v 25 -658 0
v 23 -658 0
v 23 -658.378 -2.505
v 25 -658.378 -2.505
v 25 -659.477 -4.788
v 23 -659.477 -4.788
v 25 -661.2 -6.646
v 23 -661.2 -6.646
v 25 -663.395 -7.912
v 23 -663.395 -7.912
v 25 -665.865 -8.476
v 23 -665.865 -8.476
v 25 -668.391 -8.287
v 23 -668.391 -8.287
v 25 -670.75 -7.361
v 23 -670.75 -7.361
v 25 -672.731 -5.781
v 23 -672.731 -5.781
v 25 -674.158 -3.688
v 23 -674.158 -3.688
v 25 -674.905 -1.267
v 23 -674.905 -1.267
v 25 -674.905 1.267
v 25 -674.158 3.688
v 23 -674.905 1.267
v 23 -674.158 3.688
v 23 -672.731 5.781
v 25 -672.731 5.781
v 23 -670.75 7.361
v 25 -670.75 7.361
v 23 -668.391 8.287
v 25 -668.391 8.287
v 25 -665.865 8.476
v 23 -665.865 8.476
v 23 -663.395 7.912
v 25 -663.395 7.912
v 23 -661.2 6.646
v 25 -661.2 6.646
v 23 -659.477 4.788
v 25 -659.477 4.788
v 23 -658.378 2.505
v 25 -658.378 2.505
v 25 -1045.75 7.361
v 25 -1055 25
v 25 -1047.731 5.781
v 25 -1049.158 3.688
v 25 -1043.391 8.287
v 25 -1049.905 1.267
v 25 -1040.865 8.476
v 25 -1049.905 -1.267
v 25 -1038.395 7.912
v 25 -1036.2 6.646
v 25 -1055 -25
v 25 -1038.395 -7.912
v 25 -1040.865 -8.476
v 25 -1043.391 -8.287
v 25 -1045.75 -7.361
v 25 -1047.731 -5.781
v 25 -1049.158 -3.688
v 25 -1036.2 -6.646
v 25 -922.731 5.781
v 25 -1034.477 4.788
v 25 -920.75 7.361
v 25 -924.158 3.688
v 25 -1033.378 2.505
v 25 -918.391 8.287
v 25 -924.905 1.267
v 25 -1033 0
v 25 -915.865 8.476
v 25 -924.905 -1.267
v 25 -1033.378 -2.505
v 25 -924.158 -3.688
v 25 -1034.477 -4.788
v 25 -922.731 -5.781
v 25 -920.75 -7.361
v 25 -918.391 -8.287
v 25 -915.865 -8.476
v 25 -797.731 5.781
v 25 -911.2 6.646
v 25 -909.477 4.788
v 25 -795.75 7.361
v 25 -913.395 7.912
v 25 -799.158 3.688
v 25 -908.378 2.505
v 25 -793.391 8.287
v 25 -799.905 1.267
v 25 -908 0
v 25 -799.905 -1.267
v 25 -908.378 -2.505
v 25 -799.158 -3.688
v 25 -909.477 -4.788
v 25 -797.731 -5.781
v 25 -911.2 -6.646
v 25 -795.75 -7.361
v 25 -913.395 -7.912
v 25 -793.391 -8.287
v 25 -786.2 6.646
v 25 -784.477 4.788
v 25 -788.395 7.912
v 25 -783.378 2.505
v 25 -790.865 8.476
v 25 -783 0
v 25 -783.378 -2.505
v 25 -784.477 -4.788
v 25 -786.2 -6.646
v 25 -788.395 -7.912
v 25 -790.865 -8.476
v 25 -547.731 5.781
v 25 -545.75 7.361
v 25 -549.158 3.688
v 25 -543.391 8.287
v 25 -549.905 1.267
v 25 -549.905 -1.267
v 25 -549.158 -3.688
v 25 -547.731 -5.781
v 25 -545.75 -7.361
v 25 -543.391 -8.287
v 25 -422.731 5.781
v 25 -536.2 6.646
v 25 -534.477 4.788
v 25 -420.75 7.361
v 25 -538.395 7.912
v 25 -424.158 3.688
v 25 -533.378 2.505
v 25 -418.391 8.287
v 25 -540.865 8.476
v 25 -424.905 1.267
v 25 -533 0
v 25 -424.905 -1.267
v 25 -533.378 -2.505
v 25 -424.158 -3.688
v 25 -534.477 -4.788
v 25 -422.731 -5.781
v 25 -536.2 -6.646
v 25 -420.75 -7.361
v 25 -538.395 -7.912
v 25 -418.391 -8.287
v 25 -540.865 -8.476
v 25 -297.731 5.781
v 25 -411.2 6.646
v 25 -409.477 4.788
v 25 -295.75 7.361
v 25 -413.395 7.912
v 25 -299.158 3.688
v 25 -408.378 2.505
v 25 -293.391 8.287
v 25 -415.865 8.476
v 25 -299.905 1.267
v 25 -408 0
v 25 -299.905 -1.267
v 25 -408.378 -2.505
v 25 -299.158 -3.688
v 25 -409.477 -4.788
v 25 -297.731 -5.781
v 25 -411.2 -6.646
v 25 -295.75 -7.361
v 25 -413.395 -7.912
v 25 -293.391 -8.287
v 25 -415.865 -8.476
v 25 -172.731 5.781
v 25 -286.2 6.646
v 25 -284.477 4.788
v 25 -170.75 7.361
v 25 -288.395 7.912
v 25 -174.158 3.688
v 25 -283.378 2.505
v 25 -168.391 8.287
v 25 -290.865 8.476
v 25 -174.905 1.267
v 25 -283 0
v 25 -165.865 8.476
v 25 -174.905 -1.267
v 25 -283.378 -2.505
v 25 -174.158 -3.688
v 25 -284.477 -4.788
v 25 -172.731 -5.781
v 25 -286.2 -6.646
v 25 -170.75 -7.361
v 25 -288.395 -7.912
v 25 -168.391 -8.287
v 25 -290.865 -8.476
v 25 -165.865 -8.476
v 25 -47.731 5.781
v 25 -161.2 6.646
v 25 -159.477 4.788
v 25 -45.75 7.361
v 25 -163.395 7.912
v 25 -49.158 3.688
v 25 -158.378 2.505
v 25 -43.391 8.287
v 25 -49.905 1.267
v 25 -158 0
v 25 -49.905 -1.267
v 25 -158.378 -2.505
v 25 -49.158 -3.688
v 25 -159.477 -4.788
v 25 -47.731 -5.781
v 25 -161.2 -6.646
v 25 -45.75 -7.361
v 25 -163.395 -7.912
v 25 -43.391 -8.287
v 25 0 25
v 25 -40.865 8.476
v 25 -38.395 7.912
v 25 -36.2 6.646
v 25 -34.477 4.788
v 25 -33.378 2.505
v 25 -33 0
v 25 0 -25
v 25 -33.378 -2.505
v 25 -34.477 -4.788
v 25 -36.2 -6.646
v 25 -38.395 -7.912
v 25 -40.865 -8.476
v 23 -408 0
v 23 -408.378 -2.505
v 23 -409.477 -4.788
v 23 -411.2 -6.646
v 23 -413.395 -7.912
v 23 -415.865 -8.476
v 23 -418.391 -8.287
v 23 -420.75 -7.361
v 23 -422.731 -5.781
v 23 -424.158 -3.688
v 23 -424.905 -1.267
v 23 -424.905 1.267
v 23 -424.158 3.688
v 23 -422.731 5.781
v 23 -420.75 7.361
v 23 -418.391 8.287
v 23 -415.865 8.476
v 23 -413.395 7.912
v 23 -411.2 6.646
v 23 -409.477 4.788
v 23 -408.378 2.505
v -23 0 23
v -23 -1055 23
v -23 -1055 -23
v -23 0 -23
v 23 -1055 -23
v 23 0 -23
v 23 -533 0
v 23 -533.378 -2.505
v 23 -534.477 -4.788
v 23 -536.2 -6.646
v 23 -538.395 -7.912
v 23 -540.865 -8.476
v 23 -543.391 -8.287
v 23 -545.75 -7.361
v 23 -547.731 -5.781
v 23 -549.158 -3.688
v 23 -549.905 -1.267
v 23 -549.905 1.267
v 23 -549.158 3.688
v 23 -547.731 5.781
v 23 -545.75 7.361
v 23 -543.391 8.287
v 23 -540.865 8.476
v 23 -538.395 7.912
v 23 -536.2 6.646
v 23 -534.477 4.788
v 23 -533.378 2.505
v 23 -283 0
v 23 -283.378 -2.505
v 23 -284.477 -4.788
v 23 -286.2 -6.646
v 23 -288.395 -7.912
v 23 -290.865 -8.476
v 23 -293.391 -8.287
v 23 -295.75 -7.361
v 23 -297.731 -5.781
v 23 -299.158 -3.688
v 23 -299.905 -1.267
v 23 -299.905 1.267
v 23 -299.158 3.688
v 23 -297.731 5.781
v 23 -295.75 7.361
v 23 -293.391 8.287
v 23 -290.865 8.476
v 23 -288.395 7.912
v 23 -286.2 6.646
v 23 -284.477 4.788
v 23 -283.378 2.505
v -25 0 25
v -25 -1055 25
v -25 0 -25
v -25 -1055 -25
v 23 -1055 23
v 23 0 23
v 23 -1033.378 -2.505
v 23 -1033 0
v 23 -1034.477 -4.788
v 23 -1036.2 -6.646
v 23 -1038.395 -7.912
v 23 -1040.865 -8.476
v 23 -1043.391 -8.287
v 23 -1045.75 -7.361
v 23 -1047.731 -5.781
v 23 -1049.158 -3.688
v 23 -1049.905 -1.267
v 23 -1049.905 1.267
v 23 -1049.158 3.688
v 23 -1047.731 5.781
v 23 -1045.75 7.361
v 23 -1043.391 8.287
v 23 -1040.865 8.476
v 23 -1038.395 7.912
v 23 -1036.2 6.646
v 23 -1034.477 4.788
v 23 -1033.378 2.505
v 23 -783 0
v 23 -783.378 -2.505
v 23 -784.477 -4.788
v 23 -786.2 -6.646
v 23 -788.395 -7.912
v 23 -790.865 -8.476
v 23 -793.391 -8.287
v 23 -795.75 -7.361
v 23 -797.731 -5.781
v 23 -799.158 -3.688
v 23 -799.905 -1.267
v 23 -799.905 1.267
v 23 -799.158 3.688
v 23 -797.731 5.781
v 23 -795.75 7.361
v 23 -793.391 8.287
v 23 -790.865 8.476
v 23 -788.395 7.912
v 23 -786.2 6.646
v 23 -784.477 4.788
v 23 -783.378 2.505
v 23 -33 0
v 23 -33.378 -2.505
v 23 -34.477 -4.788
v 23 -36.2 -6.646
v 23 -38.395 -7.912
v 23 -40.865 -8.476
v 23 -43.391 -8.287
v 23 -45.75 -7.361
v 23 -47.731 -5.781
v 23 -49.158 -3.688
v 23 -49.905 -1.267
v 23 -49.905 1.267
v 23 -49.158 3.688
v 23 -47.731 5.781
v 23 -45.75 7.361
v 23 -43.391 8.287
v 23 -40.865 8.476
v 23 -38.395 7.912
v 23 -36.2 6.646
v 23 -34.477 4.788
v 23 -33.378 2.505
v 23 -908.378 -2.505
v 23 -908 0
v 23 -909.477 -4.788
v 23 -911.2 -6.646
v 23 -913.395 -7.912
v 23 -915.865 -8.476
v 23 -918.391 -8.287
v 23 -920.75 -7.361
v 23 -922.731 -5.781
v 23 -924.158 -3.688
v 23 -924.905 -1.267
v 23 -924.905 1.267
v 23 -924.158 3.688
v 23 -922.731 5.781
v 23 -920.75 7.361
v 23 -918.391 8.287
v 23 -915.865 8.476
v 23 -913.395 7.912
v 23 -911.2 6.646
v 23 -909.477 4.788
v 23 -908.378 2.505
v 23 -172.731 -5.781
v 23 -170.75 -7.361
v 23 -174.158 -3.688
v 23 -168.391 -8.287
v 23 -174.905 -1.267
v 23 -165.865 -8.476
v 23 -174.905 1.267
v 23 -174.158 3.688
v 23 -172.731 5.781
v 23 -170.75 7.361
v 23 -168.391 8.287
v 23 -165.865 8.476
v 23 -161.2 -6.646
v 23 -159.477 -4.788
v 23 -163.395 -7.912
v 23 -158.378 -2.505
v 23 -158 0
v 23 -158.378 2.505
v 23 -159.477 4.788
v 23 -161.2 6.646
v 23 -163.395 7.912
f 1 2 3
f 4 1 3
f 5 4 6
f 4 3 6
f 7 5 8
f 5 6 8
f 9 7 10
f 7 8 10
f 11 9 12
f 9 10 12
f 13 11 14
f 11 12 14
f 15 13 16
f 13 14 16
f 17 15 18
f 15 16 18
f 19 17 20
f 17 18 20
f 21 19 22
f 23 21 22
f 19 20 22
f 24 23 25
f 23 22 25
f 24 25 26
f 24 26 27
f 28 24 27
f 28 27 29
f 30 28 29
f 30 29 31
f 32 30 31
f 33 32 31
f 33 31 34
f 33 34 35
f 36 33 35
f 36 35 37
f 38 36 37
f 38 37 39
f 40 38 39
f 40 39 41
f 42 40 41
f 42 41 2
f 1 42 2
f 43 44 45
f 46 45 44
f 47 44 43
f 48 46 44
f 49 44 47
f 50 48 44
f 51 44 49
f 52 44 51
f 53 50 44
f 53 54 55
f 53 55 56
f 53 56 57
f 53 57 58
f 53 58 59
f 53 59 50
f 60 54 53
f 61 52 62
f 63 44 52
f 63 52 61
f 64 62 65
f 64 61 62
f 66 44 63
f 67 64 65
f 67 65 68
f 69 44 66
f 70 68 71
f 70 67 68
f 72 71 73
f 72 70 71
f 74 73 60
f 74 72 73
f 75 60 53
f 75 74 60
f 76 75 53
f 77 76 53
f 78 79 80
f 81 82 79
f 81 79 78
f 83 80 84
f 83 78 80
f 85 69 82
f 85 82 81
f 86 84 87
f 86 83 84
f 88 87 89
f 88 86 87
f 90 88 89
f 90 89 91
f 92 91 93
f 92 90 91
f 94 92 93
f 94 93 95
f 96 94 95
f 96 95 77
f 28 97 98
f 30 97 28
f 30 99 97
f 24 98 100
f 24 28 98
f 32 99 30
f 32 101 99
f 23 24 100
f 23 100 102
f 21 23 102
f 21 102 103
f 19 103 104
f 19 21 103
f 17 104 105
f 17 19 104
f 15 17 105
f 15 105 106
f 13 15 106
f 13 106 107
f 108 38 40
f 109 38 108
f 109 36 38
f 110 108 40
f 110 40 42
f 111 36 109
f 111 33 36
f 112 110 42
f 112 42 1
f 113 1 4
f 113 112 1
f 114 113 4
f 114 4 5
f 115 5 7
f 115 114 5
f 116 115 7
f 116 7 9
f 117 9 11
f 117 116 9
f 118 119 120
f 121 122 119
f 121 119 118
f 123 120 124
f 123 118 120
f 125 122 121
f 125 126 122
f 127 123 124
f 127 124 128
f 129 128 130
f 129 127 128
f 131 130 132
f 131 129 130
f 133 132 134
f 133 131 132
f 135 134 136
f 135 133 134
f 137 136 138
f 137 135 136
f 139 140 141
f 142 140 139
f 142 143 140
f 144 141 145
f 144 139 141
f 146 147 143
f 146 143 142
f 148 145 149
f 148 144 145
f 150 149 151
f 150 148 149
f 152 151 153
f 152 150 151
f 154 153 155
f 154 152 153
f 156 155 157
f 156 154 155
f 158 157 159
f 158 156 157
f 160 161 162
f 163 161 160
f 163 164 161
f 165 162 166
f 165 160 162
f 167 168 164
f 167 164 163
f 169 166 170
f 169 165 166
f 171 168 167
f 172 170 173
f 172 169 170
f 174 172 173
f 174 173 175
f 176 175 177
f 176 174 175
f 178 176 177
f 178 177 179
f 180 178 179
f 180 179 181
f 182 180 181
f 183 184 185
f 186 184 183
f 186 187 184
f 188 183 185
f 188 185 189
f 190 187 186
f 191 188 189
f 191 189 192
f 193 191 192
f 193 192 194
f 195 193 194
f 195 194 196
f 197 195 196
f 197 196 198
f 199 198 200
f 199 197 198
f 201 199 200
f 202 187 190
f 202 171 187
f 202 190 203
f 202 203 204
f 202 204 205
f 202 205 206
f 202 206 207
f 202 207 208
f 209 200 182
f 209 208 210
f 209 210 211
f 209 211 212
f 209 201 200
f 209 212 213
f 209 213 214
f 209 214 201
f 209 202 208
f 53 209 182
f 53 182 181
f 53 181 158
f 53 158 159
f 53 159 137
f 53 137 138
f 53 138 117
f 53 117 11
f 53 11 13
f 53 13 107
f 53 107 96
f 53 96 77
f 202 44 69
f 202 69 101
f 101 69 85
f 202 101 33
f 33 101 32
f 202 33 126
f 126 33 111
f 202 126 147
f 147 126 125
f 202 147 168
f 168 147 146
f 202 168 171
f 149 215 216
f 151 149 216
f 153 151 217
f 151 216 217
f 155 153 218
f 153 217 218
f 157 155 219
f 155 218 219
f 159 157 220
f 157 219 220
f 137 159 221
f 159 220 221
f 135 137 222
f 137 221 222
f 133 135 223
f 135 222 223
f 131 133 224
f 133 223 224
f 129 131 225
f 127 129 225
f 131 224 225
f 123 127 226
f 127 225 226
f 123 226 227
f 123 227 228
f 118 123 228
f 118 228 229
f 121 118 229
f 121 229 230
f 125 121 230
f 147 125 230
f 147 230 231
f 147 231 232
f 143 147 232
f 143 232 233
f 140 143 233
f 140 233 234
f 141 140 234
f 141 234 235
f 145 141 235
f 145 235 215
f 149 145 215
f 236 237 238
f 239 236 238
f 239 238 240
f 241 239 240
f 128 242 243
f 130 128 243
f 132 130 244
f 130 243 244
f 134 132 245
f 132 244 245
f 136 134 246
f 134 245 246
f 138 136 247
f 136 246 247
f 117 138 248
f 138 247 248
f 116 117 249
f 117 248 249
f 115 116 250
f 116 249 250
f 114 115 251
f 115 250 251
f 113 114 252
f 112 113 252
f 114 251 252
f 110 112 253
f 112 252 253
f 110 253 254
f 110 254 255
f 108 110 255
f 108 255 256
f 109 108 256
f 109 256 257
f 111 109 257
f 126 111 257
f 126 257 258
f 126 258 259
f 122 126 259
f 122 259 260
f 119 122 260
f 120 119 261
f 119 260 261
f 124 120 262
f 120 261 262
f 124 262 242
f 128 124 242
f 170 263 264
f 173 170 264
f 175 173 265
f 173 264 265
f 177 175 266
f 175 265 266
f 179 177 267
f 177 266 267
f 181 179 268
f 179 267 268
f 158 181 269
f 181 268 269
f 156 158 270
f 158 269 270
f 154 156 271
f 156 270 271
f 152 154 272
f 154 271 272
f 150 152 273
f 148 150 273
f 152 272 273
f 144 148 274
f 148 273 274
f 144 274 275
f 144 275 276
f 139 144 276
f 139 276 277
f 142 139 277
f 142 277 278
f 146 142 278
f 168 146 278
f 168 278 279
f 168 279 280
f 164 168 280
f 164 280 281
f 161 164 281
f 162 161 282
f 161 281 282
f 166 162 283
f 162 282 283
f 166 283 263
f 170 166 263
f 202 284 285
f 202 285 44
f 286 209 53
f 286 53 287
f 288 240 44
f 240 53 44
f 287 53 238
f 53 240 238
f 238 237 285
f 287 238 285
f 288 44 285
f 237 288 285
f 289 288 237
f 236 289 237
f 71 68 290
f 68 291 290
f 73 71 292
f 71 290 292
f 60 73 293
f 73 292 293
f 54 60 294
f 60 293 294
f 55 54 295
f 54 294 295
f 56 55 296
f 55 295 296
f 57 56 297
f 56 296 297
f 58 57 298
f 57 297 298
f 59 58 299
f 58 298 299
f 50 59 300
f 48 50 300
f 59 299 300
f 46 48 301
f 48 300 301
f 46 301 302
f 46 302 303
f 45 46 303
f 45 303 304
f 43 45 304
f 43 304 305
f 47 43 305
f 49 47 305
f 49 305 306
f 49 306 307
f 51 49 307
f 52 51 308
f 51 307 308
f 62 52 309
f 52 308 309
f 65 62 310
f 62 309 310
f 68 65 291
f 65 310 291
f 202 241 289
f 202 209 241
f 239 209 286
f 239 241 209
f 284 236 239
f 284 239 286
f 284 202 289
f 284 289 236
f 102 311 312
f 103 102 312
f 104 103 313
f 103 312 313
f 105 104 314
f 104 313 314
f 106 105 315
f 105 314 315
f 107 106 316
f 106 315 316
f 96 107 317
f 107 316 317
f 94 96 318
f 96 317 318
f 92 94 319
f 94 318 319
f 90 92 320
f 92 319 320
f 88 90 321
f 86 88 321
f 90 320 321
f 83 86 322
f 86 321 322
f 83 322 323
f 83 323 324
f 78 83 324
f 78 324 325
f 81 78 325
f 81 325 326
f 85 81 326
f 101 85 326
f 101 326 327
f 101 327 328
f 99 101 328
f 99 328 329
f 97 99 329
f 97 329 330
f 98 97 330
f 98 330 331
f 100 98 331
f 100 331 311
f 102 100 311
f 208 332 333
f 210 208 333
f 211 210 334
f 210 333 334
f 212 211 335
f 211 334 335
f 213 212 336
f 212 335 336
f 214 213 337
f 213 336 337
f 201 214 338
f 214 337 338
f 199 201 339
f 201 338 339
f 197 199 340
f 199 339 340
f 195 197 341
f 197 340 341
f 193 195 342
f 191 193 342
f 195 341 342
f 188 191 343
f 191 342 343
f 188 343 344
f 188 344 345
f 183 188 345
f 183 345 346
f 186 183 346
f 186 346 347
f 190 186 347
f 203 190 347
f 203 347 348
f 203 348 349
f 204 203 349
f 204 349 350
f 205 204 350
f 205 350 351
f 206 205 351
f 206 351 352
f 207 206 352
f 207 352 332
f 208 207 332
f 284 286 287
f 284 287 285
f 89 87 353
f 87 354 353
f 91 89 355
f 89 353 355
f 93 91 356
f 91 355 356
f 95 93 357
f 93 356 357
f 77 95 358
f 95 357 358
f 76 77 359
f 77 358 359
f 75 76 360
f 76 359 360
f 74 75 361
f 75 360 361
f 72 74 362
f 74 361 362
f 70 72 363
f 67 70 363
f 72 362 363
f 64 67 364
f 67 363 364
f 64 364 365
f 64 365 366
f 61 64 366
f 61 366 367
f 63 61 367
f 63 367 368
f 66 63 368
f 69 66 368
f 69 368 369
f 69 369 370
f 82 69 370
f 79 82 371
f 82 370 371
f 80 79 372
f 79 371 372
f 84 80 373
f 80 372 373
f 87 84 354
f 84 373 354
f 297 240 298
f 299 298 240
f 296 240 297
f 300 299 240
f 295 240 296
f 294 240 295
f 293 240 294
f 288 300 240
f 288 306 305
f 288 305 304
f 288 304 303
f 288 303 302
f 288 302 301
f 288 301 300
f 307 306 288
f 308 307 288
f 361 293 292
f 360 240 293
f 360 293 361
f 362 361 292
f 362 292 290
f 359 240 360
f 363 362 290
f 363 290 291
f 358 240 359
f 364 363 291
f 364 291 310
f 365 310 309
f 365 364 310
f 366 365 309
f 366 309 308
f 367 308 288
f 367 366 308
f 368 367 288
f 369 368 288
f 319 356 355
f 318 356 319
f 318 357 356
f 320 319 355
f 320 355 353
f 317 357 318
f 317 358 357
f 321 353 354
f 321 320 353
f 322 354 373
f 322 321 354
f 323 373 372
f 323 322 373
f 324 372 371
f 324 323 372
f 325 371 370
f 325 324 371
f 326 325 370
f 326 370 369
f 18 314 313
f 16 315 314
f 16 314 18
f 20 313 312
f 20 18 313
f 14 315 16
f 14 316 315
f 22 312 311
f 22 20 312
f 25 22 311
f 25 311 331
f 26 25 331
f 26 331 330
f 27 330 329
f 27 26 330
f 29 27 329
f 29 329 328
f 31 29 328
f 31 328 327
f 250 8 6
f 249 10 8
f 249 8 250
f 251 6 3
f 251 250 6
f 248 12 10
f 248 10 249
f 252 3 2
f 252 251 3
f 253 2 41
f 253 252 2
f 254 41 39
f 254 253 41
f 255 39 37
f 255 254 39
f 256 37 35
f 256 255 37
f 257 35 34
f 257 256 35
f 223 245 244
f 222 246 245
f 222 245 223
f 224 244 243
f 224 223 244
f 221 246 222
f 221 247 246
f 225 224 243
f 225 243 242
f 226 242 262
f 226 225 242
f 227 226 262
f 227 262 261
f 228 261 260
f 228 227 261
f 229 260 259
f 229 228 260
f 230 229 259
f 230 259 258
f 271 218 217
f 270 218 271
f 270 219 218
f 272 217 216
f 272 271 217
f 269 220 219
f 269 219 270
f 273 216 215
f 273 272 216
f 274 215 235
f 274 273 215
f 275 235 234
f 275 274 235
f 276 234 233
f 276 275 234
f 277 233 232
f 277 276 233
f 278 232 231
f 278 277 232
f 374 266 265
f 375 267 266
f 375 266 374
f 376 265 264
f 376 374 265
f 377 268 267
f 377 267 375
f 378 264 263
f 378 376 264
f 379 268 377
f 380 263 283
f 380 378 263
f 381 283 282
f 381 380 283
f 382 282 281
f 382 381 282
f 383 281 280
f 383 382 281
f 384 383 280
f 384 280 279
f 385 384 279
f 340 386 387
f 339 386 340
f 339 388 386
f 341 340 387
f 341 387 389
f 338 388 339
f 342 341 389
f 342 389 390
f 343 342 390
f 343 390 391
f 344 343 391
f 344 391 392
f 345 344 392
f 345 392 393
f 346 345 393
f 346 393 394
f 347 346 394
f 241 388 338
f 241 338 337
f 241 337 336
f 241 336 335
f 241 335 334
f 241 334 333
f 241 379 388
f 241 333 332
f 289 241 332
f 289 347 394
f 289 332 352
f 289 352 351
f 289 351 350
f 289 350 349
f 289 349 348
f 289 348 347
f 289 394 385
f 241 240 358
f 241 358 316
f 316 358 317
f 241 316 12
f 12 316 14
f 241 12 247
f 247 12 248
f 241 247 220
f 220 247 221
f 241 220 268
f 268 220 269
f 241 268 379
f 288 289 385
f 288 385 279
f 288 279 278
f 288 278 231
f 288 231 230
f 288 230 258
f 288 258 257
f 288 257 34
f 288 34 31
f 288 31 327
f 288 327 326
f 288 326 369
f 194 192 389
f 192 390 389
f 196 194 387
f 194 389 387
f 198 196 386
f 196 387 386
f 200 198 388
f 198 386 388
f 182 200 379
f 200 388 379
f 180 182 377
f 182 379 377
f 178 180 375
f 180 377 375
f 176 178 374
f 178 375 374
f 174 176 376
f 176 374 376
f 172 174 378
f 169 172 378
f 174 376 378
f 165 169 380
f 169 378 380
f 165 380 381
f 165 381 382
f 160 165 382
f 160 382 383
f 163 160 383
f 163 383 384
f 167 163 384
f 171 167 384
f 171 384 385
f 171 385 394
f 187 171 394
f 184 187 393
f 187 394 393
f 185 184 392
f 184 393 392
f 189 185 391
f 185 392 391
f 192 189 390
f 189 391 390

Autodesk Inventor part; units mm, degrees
ref_plane "YZ Plane" through (0, 0, 0) normal (1, 0, 0) x (0, 1, 0)
ref_plane "XZ Plane" through (0, 0, 0) normal (0, 1, 0) x (-1, 0, 0)
ref_plane "XY Plane" through (0, 0, 0) normal (0, 0, 1) x (1, 0, 0)
sketch "Sketch9" plane through (0, 0, 0) normal (0, 1, 0) x (-1, 0, 0)
  line L0 (25, 25) -> (-25, 25)
  line L1 (-25, 25) -> (-25, -25)
  line L2 (-25, -25) -> (25, -25)
  line L3 (25, -25) -> (25, 25)
  line L4 (25, 25) -> (-25, -25) construction
  line L5 (-25, 25) -> (25, -25) construction
  line L6 (-23, 23) -> (23, 23)
  line L7 (23, 23) -> (23, -23)
  line L8 (23, -23) -> (-23, -23)
  line L9 (-23, -23) -> (-23, 23)
  point P0 (0, 0)
  dimension "d172" = 50
  dimension "d173" = 50
  dimension "d174" = 2
extrude "Extrusion3" add sketch "Sketch9" against normal blind 1055
sketch "Sketch10" plane through (0, 0, 0) normal (1, 0, 0) x (0, 1, 0)
  line L0 (0, 25) -> (0, -25) construction
  line L1 (0, 25) -> (-1055, 25) construction
  line L2 (-1055, -25) -> (-1055, 25) construction
  line L3 (0, -25) -> (-1055, -25) construction
  line L4 (-1050, 8.5) -> (-1033, 8.5)
  line L5 (-1033, 8.5) -> (-1033, -8.5)
  line L6 (-1033, -8.5) -> (-1050, -8.5)
  line L7 (-1050, -8.5) -> (-1050, 8.5)
  line L8 (-1050, 8.5) -> (-1033, -8.5) construction
  line L9 (-1033, 8.5) -> (-1050, -8.5) construction
  circle A0 centre (-1041.5, 0) radius 8.5
  line L10 (0, 25) -> (0, -25) projected
  point P0 (0, 0)
  point P1 (0, 0)
  point P2 (-1055, 0)
  dimension "d177" = 17
  dimension "d178" = 17
  dimension "d191" = 5
extrude "Extrusion4" cut sketch "Sketch10" along normal through all contours A0
pattern_linear "Rectangular Pattern4" count 9 spacing 125 along (0, 1, 0) of "Extrusion4"
properties part number "TKS 3534 FDS WAY tube4" material "Stainless Steel"
